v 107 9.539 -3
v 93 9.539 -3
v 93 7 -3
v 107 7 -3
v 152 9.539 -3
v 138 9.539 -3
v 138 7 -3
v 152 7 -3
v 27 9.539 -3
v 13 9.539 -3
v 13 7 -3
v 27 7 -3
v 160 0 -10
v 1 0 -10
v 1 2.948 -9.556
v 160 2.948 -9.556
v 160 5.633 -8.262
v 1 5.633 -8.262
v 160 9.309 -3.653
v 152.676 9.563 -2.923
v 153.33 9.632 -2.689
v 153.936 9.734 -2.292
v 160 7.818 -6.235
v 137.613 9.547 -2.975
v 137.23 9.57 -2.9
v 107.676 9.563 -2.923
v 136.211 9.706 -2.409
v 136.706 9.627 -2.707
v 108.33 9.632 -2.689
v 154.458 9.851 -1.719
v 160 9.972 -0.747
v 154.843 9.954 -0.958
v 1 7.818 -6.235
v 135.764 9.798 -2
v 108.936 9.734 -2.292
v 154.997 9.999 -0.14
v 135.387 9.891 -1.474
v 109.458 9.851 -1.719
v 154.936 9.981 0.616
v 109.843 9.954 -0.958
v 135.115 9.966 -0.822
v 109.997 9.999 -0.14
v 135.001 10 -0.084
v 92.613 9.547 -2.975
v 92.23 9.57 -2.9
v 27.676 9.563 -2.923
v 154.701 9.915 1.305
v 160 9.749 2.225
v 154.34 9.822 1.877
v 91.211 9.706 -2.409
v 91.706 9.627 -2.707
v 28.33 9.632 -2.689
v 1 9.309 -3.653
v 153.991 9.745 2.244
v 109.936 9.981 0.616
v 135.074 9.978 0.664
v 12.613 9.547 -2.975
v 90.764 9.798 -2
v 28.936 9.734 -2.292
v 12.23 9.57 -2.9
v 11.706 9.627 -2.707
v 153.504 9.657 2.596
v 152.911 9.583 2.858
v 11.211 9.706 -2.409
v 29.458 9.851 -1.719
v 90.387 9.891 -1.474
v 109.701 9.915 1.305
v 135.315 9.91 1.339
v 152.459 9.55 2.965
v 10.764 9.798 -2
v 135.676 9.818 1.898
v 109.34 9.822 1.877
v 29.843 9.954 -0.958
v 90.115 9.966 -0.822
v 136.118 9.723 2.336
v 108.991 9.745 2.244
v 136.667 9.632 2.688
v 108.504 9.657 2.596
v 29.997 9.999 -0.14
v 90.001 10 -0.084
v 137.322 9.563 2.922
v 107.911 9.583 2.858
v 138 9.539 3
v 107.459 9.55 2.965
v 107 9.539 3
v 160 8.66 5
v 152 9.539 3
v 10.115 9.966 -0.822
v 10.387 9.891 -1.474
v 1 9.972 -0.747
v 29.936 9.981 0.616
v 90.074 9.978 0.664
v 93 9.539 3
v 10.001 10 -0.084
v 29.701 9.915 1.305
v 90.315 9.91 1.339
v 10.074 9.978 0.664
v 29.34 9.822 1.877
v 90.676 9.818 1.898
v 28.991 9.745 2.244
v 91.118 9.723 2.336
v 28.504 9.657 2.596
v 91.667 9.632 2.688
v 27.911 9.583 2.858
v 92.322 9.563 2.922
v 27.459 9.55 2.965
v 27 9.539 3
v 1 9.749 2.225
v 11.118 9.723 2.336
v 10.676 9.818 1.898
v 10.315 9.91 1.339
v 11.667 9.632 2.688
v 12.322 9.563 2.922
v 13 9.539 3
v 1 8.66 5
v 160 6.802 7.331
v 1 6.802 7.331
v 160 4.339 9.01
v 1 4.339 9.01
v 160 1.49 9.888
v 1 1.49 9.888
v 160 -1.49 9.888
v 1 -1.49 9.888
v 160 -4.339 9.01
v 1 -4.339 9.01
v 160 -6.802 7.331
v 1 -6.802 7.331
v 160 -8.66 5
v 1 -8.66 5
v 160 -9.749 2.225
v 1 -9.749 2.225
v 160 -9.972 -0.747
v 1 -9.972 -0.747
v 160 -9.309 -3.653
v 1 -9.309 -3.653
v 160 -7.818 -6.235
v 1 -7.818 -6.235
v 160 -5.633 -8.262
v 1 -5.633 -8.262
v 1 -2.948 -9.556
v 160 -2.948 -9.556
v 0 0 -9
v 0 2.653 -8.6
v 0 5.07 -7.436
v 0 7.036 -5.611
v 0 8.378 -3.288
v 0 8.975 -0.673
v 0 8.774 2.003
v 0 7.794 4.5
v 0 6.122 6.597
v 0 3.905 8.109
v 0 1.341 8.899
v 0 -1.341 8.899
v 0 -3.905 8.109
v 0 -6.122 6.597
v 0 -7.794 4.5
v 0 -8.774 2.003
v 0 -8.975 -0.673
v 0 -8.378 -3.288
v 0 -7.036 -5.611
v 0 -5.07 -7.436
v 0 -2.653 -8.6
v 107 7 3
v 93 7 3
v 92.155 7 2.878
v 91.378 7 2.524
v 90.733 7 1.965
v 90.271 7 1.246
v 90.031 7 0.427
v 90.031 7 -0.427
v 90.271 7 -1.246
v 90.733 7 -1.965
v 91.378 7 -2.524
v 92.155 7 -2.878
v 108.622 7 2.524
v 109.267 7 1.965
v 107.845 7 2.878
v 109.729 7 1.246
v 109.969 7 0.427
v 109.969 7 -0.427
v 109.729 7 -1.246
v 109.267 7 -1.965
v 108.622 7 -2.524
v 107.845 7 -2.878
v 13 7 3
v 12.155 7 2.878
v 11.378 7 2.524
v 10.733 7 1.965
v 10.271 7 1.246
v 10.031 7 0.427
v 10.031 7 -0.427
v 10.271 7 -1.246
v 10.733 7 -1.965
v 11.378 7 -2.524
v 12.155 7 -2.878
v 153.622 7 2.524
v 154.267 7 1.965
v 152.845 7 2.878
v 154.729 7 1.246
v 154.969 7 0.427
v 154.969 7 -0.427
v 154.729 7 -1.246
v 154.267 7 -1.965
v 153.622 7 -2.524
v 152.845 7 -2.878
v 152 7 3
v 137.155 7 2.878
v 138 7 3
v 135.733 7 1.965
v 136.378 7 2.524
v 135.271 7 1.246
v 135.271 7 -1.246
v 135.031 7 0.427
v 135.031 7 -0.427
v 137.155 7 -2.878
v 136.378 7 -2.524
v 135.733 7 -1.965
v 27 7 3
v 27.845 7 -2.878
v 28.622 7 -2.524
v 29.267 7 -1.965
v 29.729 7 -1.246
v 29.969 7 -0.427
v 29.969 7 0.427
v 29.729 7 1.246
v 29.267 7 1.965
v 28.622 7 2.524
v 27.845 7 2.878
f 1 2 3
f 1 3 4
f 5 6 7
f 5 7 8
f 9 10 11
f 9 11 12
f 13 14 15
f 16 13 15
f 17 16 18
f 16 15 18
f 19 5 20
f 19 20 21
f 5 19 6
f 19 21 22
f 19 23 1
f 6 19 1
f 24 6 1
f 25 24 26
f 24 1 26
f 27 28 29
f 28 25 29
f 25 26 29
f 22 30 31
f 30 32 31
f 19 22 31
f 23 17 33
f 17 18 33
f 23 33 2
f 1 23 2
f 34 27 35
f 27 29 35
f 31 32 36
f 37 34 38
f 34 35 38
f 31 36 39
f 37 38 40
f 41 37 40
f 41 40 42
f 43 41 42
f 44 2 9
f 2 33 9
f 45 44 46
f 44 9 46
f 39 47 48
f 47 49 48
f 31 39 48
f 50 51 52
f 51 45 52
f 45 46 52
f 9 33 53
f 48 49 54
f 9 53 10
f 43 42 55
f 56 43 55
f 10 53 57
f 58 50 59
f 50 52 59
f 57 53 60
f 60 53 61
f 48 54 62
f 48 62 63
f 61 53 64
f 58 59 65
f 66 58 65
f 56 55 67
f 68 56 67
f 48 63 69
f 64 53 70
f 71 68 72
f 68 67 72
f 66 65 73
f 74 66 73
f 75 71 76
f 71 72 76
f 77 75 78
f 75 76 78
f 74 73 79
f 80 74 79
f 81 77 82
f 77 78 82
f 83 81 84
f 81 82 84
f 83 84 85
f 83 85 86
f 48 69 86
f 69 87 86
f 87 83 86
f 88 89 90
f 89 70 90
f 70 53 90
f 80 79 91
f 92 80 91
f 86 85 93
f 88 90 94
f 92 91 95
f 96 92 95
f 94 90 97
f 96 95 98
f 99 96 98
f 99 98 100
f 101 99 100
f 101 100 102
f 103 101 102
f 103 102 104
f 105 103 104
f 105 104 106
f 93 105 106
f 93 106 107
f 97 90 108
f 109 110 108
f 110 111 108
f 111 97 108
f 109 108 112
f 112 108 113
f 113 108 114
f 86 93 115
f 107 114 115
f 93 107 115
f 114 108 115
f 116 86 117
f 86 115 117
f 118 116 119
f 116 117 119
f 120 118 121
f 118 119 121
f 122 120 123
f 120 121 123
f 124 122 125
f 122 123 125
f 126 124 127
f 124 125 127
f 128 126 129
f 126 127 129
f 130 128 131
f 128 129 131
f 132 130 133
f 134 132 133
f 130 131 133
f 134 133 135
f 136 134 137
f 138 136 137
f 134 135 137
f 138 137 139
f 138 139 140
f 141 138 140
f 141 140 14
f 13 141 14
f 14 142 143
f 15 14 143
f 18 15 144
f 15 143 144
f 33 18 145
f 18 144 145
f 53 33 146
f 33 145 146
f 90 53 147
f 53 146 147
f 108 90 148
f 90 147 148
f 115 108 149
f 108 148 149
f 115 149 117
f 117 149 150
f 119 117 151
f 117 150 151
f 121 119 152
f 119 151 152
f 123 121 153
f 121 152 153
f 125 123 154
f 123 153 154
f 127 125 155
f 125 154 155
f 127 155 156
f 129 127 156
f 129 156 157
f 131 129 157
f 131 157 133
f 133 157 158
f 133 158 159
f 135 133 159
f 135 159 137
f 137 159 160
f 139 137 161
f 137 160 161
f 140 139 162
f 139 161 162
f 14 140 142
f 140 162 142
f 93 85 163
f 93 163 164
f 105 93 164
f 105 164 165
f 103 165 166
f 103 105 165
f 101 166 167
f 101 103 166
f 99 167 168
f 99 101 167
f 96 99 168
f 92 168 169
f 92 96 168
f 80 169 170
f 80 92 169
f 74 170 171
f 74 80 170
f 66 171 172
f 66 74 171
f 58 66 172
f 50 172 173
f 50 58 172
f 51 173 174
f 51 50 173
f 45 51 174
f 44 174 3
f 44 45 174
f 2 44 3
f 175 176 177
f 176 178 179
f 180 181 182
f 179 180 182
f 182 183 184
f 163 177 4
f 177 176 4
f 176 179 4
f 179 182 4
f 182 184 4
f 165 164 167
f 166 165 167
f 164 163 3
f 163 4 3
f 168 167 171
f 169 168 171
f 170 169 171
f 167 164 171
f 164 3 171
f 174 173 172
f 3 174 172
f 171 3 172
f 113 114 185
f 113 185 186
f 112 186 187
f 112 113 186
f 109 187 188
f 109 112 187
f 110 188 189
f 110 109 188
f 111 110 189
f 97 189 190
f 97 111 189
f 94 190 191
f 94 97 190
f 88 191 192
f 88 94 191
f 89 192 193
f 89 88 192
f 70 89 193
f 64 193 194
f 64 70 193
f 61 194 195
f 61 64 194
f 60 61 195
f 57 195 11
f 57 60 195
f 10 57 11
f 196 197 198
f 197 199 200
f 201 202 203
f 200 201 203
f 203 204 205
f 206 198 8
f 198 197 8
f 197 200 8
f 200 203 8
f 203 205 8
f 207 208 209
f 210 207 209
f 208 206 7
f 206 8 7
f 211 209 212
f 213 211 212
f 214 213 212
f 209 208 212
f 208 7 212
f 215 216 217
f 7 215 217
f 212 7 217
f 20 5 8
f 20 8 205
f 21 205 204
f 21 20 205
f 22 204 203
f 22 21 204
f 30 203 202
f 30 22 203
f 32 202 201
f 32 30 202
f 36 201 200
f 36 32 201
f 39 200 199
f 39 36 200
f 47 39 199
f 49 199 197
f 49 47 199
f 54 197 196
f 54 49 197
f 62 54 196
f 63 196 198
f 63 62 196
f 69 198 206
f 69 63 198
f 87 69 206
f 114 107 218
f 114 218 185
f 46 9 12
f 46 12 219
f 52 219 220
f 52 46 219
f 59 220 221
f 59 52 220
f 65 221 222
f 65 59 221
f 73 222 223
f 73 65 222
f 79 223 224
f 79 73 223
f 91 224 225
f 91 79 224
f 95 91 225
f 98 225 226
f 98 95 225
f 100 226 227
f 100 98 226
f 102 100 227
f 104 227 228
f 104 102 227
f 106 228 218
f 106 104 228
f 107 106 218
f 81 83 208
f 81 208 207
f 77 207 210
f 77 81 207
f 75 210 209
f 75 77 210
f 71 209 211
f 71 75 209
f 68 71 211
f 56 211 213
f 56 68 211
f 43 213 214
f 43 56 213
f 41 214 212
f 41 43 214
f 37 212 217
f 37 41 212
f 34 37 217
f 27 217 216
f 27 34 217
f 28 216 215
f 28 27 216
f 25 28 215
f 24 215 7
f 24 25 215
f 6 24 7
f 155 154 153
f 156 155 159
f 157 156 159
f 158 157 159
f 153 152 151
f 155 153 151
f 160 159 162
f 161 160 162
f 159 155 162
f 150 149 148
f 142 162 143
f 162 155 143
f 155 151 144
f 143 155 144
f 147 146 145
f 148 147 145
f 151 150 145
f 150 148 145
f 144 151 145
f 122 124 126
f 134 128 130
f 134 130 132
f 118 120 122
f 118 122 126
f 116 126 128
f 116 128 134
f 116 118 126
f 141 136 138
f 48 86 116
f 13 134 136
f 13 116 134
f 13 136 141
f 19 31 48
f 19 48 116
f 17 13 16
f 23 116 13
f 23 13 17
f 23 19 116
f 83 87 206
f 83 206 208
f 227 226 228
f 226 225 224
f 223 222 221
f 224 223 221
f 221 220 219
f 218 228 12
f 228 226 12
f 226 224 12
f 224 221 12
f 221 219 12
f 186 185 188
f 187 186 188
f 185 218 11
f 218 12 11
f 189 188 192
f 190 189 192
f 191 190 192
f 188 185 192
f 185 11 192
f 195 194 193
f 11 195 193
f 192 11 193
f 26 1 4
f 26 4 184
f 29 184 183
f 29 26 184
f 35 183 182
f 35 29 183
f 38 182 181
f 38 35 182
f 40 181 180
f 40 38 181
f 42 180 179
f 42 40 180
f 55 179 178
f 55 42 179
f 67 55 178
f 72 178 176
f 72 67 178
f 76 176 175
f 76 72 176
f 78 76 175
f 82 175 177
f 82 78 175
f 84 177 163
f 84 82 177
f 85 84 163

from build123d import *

# Parameters (mm, degrees)
SKETCH_1_R             = 10
EXTRUDE_1_DEPTH        = 200
CUT_EXTRUDE_1_DEPTH    = 3
CHAMFER_1_SIZE         = 1
CHAMFER_2_SIZE         = 1
PATTERN_LINEAR_1_COUNT = 3
PATTERN_LINEAR_1_PITCH = 80
CUT_EXTRUDE_START      = -40
SKETCH_4_R             = 10
CUT_EXTRUDE_2_DEPTH    = 40
PATTERN_LINEAR_3_COUNT = 2
PATTERN_LINEAR_3_PITCH = 125


with BuildPart() as part:
    # 草图1 → 凸台-拉伸1 (new body)
    with BuildSketch(Plane(origin=(0, 0, 0), x_dir=(0, 0, -1), z_dir=(1, 0, 0))):
        Circle(SKETCH_1_R)
    extrude(amount=EXTRUDE_1_DEPTH)

    # 草图2 → 切除-拉伸1 (cut)
    with BuildSketch(Plane(origin=(0, 10, 0), x_dir=(1, 0, 0), z_dir=(0, 1, 0))):
        with BuildLine():
            Line((13, 3), (27, 3))
            ThreePointArc((27, 3), (30, 0), (27, -3))
            Line((27, -3), (13, -3))
            ThreePointArc((13, -3), (10, 0), (13, 3))
        make_face()
    cut_extrude_1 = extrude(amount=-CUT_EXTRUDE_1_DEPTH, mode=Mode.SUBTRACT)

    # 倒角1
    chamfer_1_edges = [part.edges().sort_by_distance(p)[0] for p in [
        (0, 0, 10),
    ]]
    chamfer(chamfer_1_edges, length=CHAMFER_1_SIZE)

    # 倒角2
    chamfer_2_edges = [part.edges().sort_by_distance(p)[0] for p in [
        (200, 0, 10),
    ]]
    chamfer(chamfer_2_edges, length=CHAMFER_2_SIZE)

    # 阵列(线性)1: 切除-拉伸1 ×3
    with Locations(*[(i * PATTERN_LINEAR_1_PITCH, 0, 0) for i in range(1, PATTERN_LINEAR_1_COUNT)]):
        add(cut_extrude_1, mode=Mode.SUBTRACT)

    # 草图4 → 切除-拉伸2 (cut)
    with BuildSketch(Plane(origin=(200, 0, 0), x_dir=(0, 0, -1), z_dir=(1, 0, 0)).offset(CUT_EXTRUDE_START)):
        Circle(SKETCH_4_R)
    extrude(amount=CUT_EXTRUDE_2_DEPTH, mode=Mode.SUBTRACT)

    # 阵列(线性)3: 切除-拉伸1 ×2
    with Locations(*[(i * PATTERN_LINEAR_3_PITCH, 0, 0) for i in range(1, PATTERN_LINEAR_3_COUNT)]):
        add(cut_extrude_1, mode=Mode.SUBTRACT)


solid = part.part
